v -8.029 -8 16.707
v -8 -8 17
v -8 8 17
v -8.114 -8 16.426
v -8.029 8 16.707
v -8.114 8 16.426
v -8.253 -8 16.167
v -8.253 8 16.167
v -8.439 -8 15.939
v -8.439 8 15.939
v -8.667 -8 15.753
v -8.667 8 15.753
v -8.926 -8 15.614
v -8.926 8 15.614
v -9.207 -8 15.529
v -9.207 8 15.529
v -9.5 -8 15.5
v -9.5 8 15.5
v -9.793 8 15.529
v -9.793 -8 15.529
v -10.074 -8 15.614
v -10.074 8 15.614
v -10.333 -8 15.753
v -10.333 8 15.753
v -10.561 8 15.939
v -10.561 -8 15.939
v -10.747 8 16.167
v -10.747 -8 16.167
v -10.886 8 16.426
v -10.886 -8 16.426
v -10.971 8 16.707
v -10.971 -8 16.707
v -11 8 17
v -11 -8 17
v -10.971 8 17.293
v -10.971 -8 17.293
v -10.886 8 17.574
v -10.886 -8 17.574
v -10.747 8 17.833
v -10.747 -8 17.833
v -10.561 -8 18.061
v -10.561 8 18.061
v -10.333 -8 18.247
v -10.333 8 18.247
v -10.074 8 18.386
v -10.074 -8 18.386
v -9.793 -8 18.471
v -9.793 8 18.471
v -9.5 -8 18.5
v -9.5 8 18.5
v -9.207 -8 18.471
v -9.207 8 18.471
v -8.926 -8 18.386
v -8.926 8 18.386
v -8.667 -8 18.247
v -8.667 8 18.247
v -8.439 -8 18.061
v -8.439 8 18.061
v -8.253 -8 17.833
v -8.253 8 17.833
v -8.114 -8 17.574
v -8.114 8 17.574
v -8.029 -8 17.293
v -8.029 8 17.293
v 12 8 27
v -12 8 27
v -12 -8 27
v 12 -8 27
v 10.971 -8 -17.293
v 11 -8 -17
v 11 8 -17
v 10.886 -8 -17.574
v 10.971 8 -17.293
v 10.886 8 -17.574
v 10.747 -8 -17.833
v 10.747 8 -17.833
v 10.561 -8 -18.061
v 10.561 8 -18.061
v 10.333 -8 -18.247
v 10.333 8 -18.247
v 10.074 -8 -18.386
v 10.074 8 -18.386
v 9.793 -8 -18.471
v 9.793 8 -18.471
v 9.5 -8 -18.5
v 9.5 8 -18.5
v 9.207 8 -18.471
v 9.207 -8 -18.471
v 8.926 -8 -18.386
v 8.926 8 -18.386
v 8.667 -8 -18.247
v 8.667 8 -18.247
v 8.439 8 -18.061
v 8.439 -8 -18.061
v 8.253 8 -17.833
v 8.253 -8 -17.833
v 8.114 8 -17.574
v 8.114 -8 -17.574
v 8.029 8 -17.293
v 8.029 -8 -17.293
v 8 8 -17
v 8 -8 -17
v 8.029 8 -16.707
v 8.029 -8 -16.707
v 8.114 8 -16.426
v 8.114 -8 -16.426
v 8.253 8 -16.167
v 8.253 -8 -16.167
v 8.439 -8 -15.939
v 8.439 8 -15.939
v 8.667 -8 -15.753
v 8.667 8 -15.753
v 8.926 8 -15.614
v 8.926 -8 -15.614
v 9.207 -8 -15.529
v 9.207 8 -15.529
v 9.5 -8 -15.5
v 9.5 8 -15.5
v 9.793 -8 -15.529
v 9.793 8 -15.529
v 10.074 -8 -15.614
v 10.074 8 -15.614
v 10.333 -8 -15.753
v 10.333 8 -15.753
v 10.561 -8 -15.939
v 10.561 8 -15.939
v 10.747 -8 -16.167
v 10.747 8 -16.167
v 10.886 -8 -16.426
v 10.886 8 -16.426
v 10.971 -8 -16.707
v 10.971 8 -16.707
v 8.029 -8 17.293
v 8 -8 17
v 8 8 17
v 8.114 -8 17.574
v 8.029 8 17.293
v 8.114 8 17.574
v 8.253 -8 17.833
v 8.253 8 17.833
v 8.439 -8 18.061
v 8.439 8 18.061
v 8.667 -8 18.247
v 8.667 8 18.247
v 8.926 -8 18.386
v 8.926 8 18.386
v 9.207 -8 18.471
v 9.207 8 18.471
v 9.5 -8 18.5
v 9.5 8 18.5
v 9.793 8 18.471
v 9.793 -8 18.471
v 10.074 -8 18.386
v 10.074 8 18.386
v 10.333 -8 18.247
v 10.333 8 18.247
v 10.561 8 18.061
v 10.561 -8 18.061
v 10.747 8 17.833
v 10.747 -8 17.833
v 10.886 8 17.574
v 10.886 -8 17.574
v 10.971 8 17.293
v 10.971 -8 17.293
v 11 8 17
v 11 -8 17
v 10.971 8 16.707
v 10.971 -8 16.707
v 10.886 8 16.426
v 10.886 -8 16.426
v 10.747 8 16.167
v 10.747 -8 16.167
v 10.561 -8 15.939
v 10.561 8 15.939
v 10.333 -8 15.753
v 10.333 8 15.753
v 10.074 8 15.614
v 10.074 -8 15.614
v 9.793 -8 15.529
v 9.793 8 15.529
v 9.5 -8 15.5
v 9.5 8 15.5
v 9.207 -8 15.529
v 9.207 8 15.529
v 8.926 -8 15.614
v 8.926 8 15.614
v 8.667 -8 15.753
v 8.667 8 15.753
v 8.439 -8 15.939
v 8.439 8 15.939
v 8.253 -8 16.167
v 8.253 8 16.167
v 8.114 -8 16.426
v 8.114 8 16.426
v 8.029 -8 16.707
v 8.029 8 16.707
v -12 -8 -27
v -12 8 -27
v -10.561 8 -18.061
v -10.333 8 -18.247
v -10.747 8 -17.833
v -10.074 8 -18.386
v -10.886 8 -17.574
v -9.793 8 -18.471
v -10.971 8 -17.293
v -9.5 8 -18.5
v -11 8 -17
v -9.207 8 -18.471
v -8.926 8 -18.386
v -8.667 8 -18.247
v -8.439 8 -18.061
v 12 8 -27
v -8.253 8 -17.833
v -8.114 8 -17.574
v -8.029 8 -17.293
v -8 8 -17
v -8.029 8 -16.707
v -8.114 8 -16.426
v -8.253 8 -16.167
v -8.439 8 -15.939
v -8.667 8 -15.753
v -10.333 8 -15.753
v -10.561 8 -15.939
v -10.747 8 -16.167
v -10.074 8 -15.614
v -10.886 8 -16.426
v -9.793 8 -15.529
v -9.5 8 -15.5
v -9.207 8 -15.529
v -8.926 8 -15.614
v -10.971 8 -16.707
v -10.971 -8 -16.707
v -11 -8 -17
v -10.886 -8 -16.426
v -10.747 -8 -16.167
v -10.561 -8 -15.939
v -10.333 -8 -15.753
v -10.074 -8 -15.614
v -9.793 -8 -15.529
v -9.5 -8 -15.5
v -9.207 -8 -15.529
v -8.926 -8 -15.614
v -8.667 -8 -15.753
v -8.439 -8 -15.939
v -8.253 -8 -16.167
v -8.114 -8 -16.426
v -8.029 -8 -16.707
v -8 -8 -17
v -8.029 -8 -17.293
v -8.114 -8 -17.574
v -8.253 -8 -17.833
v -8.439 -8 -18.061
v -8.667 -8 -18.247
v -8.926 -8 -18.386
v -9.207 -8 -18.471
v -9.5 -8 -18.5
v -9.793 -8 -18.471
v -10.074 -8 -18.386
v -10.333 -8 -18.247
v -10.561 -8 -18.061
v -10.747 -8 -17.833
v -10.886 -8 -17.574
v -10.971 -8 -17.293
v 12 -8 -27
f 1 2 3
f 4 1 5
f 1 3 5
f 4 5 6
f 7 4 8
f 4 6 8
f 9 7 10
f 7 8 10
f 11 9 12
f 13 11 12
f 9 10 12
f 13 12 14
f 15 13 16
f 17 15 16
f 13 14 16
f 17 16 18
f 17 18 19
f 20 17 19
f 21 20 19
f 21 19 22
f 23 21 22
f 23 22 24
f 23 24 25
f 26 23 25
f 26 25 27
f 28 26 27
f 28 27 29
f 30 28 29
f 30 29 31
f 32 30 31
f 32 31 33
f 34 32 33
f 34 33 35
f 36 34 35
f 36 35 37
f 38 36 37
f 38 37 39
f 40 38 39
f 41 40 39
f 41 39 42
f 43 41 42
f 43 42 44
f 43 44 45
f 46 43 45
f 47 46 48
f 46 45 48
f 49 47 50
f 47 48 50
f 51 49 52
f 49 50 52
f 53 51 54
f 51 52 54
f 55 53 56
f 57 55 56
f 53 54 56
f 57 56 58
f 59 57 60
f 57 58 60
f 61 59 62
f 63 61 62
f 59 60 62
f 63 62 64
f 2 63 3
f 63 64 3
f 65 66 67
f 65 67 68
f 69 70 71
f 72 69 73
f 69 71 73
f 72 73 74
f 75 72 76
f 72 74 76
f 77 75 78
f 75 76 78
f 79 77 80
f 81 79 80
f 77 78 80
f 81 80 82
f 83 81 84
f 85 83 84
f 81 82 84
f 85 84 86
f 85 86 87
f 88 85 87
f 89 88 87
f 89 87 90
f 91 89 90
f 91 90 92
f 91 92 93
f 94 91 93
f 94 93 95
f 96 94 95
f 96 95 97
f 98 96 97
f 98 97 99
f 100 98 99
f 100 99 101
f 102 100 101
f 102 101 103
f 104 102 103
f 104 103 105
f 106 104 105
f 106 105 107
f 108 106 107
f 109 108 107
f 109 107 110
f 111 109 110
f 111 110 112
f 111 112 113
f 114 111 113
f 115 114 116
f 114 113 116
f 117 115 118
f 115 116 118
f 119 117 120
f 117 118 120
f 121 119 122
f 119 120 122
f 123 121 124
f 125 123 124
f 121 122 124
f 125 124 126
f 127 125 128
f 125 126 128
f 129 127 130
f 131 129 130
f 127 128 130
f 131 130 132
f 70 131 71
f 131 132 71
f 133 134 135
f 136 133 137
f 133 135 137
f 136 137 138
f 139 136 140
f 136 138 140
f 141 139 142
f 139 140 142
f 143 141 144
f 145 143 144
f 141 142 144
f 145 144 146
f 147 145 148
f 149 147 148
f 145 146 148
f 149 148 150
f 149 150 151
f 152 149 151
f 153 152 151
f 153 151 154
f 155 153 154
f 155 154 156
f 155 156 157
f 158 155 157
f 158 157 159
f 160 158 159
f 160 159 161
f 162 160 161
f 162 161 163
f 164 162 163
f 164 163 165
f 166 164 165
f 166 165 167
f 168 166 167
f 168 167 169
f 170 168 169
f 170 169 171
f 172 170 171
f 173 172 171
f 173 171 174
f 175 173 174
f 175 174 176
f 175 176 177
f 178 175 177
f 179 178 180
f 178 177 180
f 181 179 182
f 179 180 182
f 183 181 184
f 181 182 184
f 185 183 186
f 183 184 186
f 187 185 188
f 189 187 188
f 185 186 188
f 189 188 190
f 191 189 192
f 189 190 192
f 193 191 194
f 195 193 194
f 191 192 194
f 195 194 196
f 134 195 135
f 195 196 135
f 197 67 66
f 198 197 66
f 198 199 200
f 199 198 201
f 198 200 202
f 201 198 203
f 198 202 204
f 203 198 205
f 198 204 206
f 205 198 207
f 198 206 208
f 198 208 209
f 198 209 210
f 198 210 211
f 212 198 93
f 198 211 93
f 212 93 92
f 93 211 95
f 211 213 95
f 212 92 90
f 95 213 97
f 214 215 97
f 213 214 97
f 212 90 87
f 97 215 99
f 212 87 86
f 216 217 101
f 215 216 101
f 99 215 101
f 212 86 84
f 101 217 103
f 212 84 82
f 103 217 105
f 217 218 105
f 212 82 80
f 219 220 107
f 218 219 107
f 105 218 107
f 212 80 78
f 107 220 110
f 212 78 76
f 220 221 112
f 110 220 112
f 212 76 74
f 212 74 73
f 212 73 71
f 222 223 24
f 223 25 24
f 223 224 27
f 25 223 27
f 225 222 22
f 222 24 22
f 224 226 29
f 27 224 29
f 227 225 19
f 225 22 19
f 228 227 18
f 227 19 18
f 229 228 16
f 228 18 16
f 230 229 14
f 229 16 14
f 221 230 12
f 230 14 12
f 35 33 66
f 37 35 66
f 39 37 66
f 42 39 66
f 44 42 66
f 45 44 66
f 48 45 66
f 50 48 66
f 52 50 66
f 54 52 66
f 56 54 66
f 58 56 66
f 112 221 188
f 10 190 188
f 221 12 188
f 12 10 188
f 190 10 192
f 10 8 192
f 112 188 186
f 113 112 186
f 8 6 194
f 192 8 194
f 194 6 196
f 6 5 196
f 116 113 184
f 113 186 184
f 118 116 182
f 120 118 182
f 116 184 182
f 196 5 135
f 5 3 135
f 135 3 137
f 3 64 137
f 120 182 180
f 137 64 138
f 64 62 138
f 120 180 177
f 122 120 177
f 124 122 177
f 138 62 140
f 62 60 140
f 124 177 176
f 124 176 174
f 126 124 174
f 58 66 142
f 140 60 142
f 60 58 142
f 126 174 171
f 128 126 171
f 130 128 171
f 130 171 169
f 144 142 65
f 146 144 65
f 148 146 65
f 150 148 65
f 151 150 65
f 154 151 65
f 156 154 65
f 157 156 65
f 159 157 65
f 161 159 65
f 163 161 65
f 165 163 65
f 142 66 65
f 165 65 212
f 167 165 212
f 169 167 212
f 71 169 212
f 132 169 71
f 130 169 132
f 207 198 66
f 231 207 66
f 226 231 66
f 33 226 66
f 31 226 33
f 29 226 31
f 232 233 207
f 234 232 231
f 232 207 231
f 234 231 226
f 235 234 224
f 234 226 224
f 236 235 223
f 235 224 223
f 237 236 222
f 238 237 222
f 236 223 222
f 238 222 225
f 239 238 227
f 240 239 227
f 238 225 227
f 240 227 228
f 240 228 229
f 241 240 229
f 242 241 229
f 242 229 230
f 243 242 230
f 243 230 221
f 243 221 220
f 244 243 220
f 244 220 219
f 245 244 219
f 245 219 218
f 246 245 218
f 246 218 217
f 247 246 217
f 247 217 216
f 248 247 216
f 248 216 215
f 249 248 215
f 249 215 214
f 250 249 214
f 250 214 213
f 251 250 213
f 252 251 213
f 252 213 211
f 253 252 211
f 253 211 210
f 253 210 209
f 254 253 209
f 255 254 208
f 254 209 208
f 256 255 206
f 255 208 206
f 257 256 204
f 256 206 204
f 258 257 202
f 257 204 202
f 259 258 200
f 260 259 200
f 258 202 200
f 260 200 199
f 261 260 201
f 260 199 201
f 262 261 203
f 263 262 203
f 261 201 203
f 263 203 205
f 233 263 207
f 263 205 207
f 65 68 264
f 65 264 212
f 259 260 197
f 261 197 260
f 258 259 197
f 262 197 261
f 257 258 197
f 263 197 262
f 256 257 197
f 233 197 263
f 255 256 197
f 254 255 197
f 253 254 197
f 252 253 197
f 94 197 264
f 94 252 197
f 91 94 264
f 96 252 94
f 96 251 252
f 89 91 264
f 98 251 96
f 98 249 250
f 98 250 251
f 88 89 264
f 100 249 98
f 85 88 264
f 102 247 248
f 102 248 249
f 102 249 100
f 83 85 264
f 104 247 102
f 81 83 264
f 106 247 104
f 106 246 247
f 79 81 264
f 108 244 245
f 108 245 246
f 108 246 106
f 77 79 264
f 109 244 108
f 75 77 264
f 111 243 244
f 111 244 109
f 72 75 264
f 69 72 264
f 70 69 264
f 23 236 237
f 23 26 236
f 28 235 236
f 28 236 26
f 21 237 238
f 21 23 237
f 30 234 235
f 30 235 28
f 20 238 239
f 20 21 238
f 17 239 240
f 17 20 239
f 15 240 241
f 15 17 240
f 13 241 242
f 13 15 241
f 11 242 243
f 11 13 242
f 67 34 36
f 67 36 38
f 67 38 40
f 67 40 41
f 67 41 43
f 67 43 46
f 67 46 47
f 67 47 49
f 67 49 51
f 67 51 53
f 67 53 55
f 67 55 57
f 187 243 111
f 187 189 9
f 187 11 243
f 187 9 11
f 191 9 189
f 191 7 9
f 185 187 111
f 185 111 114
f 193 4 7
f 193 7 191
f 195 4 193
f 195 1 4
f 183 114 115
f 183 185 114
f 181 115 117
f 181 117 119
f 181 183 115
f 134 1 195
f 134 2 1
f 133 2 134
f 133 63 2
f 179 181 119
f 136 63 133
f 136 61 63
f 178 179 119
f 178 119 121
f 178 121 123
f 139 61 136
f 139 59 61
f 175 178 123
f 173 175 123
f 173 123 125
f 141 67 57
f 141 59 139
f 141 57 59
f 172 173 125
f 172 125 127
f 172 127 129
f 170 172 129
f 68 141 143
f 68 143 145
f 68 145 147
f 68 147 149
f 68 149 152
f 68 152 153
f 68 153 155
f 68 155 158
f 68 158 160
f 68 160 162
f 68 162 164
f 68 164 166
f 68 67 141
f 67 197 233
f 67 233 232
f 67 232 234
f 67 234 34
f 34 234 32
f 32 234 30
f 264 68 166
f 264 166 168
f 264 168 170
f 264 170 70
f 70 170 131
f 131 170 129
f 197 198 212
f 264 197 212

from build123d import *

# Parameters (mm, degrees)
SKETCH_1_W         = 24
SKETCH_1_H         = 16
EXTRUDE_1_DEPTH    = 27
SKETCH1_R          = 1.5
CUT_EXTRUDE1_DEPTH = 34.600595233


with BuildPart() as part:
    # 草图1 → 凸台-拉伸1 (new, symmetric)
    with BuildSketch(Plane.XY):
        Rectangle(SKETCH_1_W, SKETCH_1_H)
    extrude(amount=EXTRUDE_1_DEPTH, both=True)

    # Sketch1 → Cut-Extrude1 (cut, through all)
    with BuildSketch(Plane(origin=(0, 8, 0), x_dir=(1, 0, 0), z_dir=(0, 1, 0))):
        with Locations(Location((-9.5, 17, 0), (0, 0, 180))):
            Circle(SKETCH1_R)
        with Locations((9.5, 17)):
            Circle(SKETCH1_R)
        with Locations(Location((9.5, -17, 0), (0, 0, 180))):
            Circle(SKETCH1_R)
        with Locations((-9.5, -17)):
            Circle(SKETCH1_R)
    extrude(amount=-CUT_EXTRUDE1_DEPTH, mode=Mode.SUBTRACT)


solid = part.part
